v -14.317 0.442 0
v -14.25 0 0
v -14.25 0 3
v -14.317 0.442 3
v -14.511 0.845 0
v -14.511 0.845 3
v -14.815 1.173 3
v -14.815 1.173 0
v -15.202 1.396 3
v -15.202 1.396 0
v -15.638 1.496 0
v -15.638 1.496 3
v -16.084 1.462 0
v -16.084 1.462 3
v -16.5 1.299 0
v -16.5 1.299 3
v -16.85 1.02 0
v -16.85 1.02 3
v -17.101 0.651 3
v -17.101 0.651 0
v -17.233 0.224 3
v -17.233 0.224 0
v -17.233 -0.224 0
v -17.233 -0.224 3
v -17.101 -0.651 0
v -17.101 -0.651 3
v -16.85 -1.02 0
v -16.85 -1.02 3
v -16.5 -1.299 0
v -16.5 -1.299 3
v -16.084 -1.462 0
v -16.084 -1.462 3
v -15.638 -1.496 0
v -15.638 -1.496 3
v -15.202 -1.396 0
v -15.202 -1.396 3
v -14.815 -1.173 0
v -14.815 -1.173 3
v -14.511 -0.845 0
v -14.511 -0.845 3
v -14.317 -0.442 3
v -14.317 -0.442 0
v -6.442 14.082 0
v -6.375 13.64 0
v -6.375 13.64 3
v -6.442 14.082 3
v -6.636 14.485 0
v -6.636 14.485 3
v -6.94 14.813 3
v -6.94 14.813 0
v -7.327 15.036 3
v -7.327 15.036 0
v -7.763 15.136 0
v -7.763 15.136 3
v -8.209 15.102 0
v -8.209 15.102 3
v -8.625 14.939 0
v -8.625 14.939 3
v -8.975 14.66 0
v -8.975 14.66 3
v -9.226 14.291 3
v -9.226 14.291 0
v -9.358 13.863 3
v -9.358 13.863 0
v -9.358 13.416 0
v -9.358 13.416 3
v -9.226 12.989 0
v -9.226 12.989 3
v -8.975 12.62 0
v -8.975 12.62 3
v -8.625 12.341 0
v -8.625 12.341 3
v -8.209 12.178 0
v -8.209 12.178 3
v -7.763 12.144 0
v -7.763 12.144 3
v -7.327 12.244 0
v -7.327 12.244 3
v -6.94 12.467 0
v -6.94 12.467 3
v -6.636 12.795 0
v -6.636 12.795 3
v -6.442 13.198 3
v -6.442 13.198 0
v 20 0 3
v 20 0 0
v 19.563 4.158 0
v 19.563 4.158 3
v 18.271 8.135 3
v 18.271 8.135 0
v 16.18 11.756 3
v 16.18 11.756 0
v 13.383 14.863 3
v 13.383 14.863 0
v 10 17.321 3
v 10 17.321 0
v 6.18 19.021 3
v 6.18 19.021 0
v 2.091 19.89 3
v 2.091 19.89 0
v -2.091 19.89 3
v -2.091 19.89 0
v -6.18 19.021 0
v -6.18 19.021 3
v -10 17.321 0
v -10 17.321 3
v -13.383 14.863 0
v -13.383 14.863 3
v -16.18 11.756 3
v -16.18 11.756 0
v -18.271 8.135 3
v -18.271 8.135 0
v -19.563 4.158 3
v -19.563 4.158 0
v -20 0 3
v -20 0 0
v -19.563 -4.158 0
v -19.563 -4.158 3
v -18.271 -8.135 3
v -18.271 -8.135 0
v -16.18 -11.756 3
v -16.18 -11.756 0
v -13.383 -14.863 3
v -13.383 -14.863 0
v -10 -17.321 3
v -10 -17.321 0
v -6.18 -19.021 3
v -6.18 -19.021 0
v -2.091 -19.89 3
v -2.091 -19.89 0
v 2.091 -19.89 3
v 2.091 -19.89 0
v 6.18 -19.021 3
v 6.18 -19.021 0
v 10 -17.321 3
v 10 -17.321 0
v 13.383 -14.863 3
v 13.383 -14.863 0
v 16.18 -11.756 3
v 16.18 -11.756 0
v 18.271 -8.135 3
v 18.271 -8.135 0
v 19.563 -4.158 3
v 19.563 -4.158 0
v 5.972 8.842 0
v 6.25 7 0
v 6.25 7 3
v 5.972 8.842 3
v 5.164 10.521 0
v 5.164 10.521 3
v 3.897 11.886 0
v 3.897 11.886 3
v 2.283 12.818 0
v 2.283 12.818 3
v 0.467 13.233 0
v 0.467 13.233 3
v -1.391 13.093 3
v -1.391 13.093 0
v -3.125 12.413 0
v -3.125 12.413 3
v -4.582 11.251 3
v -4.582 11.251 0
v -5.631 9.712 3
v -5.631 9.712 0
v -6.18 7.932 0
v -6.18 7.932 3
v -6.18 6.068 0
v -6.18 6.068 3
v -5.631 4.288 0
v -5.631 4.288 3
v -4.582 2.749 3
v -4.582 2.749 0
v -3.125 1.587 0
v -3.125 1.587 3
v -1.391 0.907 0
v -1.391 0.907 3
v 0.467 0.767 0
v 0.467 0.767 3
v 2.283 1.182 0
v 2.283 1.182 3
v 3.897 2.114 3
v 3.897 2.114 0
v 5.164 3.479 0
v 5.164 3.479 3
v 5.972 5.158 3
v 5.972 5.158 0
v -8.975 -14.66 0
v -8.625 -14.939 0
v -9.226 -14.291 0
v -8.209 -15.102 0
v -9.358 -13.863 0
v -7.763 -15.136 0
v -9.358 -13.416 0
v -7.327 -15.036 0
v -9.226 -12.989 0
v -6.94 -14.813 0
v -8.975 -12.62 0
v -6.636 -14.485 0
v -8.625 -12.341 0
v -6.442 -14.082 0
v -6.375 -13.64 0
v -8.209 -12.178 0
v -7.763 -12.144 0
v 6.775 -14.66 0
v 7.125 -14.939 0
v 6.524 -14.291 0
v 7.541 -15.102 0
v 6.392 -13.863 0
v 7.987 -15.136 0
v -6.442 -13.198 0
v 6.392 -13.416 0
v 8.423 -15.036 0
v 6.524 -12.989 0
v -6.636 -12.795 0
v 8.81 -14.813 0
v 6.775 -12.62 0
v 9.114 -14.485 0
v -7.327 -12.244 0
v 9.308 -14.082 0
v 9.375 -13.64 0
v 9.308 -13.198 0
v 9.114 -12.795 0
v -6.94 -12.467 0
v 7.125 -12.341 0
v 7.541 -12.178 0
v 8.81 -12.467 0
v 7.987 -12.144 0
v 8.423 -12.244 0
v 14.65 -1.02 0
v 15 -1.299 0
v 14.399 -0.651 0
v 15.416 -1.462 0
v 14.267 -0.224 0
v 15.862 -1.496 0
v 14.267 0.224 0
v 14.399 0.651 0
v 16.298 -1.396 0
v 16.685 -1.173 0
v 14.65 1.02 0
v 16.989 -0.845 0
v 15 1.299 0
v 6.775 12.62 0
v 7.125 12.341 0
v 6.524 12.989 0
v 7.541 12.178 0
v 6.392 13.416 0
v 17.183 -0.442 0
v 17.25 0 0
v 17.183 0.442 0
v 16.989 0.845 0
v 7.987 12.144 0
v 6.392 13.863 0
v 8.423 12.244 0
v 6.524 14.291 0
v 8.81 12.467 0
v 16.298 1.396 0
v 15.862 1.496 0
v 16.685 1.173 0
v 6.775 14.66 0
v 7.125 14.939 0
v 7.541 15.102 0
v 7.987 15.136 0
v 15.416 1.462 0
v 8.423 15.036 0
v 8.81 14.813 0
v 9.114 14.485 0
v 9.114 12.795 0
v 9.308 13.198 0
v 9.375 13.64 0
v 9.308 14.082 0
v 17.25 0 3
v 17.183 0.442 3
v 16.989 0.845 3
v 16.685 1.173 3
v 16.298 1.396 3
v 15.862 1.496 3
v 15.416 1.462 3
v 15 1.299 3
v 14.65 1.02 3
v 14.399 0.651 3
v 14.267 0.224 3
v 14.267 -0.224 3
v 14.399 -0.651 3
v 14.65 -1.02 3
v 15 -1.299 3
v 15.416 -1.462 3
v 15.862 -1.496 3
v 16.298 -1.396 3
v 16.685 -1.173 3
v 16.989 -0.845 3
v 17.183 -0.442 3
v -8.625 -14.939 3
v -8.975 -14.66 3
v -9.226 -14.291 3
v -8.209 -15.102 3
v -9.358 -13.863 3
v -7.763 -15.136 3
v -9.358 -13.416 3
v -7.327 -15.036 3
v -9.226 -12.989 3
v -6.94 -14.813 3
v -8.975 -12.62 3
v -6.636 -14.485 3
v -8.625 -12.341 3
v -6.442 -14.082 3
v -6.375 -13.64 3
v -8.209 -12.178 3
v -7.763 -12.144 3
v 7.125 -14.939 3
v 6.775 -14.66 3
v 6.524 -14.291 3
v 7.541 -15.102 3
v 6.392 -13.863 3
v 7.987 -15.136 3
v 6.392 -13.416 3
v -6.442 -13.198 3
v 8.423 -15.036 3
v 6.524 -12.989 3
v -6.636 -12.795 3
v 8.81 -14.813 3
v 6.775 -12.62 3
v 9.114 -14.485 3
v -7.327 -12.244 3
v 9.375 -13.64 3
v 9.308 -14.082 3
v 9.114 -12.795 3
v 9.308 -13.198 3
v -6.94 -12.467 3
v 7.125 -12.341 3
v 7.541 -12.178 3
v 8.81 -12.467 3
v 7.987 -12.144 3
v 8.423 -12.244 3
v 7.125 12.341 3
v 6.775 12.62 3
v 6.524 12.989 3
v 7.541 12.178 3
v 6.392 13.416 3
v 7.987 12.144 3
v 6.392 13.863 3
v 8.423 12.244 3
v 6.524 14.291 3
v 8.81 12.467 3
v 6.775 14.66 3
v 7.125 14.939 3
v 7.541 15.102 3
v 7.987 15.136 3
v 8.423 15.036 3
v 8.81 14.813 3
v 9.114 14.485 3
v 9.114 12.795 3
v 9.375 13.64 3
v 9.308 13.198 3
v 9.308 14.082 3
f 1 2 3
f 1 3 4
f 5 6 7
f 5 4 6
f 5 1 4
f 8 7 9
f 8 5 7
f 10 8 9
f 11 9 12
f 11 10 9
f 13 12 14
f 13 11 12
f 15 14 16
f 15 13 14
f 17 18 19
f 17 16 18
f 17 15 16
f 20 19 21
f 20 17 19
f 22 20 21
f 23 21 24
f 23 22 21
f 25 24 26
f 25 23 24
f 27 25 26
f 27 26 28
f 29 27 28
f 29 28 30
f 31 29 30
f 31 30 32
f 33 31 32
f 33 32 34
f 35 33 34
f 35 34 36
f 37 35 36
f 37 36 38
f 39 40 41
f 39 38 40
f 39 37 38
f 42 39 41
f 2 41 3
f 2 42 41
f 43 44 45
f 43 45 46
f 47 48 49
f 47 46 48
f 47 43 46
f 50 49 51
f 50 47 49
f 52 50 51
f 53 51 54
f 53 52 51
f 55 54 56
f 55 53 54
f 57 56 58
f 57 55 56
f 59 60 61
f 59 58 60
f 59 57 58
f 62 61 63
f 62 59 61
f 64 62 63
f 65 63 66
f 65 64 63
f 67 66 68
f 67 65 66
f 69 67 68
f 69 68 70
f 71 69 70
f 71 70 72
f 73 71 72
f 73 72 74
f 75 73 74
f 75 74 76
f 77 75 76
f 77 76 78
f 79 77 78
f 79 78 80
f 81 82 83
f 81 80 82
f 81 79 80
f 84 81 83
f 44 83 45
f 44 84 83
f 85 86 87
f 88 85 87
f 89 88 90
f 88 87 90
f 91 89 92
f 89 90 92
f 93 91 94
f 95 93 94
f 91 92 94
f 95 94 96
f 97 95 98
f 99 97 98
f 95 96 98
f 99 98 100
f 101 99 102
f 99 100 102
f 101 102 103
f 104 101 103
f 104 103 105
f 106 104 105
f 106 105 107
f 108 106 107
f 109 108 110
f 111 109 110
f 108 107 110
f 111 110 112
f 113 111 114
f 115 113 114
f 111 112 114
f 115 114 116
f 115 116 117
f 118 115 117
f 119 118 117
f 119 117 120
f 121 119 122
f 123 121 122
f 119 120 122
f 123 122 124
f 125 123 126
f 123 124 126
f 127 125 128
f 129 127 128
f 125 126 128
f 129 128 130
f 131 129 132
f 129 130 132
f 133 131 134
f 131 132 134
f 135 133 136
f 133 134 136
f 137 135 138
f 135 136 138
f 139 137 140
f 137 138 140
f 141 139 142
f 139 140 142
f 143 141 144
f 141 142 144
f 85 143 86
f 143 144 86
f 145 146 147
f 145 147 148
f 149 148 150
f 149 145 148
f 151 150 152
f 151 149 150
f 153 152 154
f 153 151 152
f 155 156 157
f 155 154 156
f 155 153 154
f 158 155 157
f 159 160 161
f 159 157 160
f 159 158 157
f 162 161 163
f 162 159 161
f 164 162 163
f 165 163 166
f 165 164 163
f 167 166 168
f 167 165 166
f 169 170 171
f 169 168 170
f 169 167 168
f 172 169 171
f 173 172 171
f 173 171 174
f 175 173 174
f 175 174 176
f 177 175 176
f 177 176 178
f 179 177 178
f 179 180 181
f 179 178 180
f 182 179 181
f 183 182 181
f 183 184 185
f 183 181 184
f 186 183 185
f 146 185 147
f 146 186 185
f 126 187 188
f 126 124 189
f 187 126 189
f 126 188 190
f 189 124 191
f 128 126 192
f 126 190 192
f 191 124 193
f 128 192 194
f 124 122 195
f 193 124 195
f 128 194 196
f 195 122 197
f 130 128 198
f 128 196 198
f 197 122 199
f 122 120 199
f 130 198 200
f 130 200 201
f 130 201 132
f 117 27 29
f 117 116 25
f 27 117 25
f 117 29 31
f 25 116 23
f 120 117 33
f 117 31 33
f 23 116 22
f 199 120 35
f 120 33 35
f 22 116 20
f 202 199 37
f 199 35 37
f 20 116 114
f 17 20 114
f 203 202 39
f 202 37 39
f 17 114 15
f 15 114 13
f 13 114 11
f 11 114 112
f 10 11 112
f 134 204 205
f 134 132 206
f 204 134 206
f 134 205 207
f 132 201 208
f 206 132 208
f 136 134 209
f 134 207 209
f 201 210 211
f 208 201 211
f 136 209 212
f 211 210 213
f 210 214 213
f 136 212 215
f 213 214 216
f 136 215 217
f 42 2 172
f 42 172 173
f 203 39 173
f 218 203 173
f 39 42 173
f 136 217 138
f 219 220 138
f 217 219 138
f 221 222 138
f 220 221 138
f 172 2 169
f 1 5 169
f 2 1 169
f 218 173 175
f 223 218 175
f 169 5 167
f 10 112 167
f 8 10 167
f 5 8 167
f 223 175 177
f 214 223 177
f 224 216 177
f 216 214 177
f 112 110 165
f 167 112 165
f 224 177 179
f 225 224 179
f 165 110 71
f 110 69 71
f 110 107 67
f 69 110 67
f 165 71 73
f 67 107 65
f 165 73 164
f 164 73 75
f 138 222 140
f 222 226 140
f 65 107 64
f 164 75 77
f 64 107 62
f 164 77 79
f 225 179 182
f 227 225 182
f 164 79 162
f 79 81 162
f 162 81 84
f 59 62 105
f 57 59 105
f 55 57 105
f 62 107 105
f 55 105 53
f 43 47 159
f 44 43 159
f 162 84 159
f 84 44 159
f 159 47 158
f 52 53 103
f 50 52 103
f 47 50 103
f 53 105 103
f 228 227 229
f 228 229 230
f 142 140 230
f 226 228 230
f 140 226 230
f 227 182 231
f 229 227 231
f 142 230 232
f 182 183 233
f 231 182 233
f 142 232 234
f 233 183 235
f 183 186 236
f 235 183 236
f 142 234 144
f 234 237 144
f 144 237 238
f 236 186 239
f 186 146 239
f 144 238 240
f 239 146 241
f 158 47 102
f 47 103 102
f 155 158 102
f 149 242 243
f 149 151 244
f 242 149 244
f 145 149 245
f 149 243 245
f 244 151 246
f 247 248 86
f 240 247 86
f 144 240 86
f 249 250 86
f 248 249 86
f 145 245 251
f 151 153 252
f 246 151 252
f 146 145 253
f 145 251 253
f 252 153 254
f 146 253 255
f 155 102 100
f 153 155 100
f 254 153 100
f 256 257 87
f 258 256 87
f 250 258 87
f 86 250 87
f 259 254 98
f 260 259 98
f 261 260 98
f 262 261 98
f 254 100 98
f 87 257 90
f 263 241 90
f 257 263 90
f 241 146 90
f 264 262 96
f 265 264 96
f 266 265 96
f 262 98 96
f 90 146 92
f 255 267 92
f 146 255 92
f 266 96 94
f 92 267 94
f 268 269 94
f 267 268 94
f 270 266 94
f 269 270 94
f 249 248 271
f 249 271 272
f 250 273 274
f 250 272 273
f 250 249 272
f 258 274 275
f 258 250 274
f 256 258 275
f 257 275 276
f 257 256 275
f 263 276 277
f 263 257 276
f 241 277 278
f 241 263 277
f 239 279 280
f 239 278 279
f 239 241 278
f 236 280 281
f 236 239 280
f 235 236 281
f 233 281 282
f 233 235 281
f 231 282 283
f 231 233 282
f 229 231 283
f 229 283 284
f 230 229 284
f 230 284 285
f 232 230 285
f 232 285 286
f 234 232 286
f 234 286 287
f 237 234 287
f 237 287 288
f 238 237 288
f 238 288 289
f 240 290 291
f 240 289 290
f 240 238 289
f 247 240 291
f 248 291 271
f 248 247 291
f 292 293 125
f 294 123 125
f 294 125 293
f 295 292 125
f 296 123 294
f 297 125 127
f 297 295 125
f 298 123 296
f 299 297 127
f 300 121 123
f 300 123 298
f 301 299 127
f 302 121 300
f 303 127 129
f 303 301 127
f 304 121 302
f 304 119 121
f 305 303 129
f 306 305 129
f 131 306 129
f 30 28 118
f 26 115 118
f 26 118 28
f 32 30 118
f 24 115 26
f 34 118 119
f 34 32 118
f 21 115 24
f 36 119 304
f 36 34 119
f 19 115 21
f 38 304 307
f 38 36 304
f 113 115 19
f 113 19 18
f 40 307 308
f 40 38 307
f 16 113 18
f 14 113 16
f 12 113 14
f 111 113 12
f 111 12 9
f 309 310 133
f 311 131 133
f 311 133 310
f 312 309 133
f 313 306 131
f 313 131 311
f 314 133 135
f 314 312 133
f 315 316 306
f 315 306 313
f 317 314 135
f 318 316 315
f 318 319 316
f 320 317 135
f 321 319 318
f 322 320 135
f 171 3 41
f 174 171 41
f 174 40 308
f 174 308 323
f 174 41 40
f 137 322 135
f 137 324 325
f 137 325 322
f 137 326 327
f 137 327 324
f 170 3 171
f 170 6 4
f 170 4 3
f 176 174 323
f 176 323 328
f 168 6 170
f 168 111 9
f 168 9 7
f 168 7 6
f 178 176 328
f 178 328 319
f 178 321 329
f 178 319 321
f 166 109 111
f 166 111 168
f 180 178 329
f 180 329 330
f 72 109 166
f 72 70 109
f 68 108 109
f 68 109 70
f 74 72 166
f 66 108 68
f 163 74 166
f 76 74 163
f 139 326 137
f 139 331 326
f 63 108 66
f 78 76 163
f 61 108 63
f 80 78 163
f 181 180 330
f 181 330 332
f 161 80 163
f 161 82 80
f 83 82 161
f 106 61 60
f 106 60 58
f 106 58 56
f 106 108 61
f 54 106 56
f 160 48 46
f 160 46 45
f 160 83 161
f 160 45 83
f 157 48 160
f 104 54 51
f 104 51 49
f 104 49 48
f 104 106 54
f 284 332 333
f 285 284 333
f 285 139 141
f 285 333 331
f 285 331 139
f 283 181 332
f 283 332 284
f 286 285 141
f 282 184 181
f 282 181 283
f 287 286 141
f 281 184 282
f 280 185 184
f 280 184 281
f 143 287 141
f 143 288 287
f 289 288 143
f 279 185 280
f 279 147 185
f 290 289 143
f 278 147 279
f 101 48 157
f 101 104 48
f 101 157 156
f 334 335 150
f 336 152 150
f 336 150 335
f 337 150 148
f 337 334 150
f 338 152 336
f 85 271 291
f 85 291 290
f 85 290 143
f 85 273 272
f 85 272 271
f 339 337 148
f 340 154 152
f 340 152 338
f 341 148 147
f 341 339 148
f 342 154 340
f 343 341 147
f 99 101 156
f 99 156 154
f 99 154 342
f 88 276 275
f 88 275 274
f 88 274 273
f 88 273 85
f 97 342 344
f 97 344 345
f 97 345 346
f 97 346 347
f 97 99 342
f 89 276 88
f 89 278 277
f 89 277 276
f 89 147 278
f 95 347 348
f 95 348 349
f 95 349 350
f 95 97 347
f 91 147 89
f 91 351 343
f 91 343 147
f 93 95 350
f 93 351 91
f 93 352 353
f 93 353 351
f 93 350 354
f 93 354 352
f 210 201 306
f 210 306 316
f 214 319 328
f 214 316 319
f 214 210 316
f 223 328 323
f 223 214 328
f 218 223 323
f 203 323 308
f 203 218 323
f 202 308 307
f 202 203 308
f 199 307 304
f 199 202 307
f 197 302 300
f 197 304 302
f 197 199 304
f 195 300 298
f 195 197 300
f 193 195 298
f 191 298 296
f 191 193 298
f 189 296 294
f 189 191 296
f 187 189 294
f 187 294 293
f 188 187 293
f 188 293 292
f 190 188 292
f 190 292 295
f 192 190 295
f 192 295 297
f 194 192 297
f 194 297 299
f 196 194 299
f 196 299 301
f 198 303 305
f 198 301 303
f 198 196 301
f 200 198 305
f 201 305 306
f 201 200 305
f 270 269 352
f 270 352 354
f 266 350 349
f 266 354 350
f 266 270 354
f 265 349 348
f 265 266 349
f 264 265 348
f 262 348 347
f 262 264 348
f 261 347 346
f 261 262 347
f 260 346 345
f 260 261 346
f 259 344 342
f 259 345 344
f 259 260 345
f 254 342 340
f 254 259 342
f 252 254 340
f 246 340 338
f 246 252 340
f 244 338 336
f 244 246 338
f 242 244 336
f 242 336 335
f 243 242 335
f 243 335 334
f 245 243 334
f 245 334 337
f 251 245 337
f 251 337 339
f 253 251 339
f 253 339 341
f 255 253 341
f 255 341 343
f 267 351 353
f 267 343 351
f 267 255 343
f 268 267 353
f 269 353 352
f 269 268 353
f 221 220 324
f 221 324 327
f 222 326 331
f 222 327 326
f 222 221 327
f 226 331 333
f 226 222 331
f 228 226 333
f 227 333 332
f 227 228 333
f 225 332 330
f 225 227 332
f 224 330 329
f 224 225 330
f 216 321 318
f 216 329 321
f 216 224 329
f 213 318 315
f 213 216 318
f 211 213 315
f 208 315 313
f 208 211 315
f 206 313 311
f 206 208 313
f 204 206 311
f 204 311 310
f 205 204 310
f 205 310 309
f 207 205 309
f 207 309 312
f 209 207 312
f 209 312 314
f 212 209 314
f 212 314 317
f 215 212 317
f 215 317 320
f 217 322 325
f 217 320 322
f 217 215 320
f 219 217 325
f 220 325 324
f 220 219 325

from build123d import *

# Parameters (mm, degrees)
SKETCH3_R               = 20
BOSS_EXTRUDE1_DEPTH     = 3
CUT_EXTRUDE2_DEPTH      = 29.442925307
CUT_EXTRUDE2_DEPTH_BACK = 29.442925307
SKETCH2_R               = 1.5
SKETCH2_R_2             = 6.25


with BuildPart() as part:
    # Sketch3 → Boss-Extrude1 (new body)
    with BuildSketch(Plane.XY):
        Circle(SKETCH3_R)
    extrude(amount=BOSS_EXTRUDE1_DEPTH)

    # Sketch2 → Cut-Extrude2 (cut, two sides: drawn at the far end of the back side and taken through both)
    with BuildSketch(Plane.XY.offset(-CUT_EXTRUDE2_DEPTH_BACK)):
        with Locations((-15.75, 0)):
            Circle(SKETCH2_R)
        with Locations((-7.875, 13.63990011)):
            Circle(SKETCH2_R)
        with Locations((7.875, 13.63990011)):
            Circle(SKETCH2_R)
        with Locations((15.75, 0)):
            Circle(SKETCH2_R)
        with Locations((7.875, -13.63990011)):
            Circle(SKETCH2_R)
        with Locations((-7.875, -13.63990011)):
            Circle(SKETCH2_R)
        with Locations((0, 7)):
            Circle(SKETCH2_R_2)
    extrude(amount=CUT_EXTRUDE2_DEPTH + CUT_EXTRUDE2_DEPTH_BACK, mode=Mode.SUBTRACT)


solid = part.part
